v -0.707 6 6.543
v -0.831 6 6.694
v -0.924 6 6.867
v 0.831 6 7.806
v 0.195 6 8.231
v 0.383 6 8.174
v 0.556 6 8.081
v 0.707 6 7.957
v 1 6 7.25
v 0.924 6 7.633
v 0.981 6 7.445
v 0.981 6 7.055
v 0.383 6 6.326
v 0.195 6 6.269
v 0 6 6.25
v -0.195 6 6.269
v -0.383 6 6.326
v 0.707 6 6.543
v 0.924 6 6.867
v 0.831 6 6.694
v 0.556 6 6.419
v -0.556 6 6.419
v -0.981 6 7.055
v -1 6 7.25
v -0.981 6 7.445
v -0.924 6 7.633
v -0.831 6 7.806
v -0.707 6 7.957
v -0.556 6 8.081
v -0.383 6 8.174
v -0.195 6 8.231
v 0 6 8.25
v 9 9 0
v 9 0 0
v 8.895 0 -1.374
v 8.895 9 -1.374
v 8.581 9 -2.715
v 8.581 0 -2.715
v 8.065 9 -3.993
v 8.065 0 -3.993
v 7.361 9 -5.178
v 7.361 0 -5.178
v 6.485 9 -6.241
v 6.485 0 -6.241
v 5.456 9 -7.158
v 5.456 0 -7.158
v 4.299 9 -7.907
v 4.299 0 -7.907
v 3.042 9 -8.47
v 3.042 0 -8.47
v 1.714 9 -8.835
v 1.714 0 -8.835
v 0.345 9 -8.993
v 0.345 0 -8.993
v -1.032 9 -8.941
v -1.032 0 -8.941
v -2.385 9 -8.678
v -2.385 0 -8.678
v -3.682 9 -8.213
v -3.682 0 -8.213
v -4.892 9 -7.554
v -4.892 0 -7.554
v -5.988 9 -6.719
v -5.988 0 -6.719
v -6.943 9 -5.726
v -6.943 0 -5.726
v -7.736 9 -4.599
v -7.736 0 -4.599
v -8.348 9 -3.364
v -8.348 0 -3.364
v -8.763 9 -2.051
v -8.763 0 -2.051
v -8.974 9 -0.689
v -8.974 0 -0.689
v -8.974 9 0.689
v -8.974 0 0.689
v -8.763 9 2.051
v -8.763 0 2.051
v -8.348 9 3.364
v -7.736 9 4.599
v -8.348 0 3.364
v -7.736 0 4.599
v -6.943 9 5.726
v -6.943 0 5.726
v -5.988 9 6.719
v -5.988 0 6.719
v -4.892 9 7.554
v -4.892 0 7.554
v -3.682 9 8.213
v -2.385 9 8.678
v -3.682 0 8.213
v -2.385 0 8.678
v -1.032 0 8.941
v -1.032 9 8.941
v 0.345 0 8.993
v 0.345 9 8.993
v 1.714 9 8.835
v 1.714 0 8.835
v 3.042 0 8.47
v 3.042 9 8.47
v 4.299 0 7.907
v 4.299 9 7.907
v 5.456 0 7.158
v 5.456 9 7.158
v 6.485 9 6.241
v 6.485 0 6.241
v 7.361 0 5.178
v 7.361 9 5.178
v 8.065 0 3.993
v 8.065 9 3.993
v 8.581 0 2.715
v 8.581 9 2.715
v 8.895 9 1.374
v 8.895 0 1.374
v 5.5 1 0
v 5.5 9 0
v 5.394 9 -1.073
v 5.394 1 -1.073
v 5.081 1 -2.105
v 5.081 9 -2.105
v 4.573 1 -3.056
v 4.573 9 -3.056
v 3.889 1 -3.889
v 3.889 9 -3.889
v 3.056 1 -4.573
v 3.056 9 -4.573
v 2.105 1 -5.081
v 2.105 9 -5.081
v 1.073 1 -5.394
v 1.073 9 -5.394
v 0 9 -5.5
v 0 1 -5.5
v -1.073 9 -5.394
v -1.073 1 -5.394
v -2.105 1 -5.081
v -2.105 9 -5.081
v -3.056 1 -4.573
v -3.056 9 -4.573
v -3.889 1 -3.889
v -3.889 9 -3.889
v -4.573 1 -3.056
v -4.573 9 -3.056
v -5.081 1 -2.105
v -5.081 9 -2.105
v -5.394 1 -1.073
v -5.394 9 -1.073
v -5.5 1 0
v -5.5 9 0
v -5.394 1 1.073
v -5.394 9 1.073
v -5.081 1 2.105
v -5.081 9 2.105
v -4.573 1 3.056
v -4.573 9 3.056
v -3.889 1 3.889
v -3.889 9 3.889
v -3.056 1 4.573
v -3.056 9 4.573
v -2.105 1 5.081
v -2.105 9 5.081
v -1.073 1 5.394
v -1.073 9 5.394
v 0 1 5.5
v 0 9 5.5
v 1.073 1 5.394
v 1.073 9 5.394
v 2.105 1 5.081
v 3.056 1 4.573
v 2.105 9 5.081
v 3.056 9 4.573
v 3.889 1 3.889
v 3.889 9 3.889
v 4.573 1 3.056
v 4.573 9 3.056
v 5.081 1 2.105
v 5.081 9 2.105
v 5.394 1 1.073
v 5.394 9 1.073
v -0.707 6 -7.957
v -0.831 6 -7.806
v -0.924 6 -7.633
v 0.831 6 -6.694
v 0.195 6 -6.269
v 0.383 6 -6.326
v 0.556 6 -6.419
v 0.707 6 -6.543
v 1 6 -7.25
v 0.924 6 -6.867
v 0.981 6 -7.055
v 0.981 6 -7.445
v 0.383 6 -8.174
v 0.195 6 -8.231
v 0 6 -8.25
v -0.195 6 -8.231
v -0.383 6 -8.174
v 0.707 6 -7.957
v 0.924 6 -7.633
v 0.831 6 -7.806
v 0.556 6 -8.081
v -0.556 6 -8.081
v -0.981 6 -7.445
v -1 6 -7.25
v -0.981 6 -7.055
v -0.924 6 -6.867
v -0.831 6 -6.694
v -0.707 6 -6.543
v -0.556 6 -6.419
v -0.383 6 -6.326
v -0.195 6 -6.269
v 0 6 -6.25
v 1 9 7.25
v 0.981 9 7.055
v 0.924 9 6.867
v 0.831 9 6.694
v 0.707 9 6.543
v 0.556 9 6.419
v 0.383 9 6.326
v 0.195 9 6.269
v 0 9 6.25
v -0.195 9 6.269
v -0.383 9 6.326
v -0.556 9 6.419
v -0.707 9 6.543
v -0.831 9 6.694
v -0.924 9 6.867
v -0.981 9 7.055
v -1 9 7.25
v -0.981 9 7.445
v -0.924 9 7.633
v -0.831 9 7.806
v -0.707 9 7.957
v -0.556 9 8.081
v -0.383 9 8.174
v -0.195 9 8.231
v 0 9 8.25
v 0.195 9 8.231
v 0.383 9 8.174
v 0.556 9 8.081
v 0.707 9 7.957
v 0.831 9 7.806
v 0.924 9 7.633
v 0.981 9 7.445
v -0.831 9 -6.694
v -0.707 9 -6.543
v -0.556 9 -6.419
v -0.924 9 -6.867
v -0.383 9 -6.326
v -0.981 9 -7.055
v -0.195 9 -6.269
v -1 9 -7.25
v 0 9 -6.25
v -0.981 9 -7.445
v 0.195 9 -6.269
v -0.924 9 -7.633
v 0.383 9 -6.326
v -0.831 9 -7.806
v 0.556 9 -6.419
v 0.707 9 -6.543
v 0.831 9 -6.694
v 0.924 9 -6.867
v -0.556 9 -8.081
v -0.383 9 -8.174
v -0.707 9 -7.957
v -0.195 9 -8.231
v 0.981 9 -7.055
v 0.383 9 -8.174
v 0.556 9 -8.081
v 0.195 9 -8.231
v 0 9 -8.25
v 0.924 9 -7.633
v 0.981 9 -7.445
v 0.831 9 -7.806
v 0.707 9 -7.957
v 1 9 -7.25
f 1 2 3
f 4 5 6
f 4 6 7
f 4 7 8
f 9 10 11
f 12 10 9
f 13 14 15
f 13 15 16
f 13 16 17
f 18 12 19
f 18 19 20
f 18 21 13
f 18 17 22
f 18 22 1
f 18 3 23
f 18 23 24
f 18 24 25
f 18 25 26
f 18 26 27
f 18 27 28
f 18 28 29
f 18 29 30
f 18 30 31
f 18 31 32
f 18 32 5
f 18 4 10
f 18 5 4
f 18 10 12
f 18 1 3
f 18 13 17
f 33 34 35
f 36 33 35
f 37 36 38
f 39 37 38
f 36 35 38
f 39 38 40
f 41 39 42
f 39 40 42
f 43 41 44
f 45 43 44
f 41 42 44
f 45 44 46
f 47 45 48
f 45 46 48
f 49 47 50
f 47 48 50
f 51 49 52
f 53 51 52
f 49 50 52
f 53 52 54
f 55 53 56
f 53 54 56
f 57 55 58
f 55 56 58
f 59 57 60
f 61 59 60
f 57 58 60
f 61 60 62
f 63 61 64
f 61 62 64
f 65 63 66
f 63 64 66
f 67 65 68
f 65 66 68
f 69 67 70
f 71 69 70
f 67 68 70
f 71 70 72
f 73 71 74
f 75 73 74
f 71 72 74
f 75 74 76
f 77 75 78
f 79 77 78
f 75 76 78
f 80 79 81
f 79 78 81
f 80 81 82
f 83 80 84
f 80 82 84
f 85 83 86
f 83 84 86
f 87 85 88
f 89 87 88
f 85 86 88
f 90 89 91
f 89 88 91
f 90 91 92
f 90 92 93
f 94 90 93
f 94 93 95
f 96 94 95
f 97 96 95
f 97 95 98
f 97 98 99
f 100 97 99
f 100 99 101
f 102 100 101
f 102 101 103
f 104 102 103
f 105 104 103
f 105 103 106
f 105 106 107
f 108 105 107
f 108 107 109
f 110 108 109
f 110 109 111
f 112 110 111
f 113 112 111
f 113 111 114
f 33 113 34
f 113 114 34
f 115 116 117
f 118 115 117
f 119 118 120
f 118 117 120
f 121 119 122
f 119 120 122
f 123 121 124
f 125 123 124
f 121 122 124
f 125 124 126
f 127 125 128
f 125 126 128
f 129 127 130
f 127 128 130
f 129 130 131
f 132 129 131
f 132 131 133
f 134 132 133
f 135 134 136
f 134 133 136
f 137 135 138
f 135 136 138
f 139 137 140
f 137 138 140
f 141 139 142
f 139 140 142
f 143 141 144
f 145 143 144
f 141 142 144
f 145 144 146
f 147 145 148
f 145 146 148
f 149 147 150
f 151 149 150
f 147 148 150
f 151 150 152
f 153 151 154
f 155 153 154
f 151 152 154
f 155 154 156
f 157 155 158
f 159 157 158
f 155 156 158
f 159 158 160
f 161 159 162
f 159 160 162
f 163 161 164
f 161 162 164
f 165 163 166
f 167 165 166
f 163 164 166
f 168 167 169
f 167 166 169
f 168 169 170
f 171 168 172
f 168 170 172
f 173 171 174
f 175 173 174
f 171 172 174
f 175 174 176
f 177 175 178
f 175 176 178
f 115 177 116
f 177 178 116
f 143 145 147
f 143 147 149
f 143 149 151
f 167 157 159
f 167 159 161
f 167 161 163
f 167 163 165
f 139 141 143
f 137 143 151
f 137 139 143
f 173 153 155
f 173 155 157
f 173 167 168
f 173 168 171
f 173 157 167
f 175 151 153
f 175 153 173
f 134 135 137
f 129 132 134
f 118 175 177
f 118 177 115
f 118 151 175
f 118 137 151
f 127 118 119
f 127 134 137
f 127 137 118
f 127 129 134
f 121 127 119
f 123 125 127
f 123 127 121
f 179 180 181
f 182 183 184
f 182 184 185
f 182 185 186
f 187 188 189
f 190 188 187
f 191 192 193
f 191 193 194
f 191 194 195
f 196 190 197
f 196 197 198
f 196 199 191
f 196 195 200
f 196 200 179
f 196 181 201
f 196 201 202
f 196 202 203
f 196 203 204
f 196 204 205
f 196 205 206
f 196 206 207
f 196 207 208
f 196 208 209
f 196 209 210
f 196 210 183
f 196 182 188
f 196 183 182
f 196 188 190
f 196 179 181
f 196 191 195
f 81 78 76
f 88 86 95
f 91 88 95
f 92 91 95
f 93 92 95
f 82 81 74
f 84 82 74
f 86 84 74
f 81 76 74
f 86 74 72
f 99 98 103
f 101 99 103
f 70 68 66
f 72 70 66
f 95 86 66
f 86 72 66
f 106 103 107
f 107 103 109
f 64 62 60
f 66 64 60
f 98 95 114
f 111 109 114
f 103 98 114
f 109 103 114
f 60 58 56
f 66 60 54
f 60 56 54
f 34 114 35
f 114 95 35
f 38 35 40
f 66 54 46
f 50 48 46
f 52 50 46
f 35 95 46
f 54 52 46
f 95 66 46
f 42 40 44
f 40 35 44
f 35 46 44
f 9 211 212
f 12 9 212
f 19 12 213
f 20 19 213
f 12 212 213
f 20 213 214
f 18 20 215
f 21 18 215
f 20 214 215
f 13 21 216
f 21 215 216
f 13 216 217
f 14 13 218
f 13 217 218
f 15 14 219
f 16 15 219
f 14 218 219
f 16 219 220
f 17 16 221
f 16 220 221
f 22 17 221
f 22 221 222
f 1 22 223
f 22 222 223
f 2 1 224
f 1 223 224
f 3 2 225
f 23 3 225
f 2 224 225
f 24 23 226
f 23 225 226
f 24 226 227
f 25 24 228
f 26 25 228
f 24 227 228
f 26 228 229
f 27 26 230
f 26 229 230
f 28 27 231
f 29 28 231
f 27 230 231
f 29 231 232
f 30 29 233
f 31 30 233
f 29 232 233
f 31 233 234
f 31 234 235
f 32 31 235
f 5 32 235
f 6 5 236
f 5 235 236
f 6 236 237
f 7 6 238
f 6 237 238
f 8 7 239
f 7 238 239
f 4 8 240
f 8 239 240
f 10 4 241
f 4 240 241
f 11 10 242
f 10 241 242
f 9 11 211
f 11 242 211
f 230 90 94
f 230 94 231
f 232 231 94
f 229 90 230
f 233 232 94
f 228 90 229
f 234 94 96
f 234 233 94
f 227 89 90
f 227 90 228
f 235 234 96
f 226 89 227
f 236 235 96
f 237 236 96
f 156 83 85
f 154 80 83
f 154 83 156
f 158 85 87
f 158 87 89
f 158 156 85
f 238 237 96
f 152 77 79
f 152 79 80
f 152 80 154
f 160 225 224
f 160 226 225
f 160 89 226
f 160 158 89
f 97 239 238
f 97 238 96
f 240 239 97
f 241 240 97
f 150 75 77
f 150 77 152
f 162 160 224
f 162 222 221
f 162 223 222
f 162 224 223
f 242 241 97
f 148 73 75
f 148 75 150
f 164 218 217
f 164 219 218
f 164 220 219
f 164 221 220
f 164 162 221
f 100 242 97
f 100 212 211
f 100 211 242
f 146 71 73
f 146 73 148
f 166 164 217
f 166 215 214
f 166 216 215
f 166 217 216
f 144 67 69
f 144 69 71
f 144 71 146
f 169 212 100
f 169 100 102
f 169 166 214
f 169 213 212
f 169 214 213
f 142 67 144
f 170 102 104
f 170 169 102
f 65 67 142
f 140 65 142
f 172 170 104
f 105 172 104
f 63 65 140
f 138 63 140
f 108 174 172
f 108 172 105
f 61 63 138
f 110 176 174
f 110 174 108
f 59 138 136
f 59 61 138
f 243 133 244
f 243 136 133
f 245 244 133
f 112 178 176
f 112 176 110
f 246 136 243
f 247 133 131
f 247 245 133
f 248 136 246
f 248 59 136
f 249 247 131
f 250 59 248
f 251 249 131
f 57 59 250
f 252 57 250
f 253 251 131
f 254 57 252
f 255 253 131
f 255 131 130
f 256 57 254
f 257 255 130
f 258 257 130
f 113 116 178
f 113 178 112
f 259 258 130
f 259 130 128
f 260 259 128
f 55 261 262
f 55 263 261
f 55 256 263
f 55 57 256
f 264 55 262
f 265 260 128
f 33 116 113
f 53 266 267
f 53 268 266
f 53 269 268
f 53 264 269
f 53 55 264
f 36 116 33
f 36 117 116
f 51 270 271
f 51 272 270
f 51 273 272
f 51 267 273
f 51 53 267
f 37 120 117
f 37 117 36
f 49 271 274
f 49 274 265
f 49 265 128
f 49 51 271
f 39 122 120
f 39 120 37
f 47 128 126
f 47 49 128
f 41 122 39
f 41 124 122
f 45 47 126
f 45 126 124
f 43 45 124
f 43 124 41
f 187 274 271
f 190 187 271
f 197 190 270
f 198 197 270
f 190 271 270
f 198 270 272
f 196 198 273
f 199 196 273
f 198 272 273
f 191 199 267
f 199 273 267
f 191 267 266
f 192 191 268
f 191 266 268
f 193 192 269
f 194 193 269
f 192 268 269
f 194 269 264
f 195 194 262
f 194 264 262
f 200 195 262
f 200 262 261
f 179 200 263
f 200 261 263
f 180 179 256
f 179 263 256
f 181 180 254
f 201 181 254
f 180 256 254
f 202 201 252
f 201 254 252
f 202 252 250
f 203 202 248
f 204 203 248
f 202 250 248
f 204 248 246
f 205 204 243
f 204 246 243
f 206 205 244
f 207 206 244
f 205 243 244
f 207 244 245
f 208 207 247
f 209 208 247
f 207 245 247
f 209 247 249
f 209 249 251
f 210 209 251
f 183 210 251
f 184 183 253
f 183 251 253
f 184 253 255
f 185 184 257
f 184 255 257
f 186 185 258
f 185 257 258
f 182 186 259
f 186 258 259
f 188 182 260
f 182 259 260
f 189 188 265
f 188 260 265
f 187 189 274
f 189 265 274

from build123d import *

# Parameters (mm, degrees)
SKETCH1_R           = 9
BOSS_EXTRUDE1_DEPTH = 9
SKETCH2_R           = 5.5
CUT_EXTRUDE1_DEPTH  = 8
SKETCH3_R           = 1
CUT_EXTRUDE2_DEPTH  = 3


with BuildPart() as part:
    # Sketch1 → Boss-Extrude1 (new body)
    with BuildSketch(Plane(origin=(0, 0, 0), x_dir=(1, 0, 0), z_dir=(0, 1, 0))):
        Circle(SKETCH1_R)
    extrude(amount=BOSS_EXTRUDE1_DEPTH)

    # Sketch2 → Cut-Extrude1 (cut)
    with BuildSketch(Plane(origin=(0, 9, 0), x_dir=(1, 0, 0), z_dir=(0, 1, 0))):
        Circle(SKETCH2_R)
    extrude(amount=-CUT_EXTRUDE1_DEPTH, mode=Mode.SUBTRACT)

    # Sketch3 → Cut-Extrude2 (cut)
    with BuildSketch(Plane(origin=(0, 9, 0), x_dir=(1, 0, 0), z_dir=(0, 1, 0))):
        with Locations((0, 7.25)):
            Circle(SKETCH3_R)
        with Locations((0, -7.25)):
            Circle(SKETCH3_R)
    extrude(amount=-CUT_EXTRUDE2_DEPTH, mode=Mode.SUBTRACT)


solid = part.part
